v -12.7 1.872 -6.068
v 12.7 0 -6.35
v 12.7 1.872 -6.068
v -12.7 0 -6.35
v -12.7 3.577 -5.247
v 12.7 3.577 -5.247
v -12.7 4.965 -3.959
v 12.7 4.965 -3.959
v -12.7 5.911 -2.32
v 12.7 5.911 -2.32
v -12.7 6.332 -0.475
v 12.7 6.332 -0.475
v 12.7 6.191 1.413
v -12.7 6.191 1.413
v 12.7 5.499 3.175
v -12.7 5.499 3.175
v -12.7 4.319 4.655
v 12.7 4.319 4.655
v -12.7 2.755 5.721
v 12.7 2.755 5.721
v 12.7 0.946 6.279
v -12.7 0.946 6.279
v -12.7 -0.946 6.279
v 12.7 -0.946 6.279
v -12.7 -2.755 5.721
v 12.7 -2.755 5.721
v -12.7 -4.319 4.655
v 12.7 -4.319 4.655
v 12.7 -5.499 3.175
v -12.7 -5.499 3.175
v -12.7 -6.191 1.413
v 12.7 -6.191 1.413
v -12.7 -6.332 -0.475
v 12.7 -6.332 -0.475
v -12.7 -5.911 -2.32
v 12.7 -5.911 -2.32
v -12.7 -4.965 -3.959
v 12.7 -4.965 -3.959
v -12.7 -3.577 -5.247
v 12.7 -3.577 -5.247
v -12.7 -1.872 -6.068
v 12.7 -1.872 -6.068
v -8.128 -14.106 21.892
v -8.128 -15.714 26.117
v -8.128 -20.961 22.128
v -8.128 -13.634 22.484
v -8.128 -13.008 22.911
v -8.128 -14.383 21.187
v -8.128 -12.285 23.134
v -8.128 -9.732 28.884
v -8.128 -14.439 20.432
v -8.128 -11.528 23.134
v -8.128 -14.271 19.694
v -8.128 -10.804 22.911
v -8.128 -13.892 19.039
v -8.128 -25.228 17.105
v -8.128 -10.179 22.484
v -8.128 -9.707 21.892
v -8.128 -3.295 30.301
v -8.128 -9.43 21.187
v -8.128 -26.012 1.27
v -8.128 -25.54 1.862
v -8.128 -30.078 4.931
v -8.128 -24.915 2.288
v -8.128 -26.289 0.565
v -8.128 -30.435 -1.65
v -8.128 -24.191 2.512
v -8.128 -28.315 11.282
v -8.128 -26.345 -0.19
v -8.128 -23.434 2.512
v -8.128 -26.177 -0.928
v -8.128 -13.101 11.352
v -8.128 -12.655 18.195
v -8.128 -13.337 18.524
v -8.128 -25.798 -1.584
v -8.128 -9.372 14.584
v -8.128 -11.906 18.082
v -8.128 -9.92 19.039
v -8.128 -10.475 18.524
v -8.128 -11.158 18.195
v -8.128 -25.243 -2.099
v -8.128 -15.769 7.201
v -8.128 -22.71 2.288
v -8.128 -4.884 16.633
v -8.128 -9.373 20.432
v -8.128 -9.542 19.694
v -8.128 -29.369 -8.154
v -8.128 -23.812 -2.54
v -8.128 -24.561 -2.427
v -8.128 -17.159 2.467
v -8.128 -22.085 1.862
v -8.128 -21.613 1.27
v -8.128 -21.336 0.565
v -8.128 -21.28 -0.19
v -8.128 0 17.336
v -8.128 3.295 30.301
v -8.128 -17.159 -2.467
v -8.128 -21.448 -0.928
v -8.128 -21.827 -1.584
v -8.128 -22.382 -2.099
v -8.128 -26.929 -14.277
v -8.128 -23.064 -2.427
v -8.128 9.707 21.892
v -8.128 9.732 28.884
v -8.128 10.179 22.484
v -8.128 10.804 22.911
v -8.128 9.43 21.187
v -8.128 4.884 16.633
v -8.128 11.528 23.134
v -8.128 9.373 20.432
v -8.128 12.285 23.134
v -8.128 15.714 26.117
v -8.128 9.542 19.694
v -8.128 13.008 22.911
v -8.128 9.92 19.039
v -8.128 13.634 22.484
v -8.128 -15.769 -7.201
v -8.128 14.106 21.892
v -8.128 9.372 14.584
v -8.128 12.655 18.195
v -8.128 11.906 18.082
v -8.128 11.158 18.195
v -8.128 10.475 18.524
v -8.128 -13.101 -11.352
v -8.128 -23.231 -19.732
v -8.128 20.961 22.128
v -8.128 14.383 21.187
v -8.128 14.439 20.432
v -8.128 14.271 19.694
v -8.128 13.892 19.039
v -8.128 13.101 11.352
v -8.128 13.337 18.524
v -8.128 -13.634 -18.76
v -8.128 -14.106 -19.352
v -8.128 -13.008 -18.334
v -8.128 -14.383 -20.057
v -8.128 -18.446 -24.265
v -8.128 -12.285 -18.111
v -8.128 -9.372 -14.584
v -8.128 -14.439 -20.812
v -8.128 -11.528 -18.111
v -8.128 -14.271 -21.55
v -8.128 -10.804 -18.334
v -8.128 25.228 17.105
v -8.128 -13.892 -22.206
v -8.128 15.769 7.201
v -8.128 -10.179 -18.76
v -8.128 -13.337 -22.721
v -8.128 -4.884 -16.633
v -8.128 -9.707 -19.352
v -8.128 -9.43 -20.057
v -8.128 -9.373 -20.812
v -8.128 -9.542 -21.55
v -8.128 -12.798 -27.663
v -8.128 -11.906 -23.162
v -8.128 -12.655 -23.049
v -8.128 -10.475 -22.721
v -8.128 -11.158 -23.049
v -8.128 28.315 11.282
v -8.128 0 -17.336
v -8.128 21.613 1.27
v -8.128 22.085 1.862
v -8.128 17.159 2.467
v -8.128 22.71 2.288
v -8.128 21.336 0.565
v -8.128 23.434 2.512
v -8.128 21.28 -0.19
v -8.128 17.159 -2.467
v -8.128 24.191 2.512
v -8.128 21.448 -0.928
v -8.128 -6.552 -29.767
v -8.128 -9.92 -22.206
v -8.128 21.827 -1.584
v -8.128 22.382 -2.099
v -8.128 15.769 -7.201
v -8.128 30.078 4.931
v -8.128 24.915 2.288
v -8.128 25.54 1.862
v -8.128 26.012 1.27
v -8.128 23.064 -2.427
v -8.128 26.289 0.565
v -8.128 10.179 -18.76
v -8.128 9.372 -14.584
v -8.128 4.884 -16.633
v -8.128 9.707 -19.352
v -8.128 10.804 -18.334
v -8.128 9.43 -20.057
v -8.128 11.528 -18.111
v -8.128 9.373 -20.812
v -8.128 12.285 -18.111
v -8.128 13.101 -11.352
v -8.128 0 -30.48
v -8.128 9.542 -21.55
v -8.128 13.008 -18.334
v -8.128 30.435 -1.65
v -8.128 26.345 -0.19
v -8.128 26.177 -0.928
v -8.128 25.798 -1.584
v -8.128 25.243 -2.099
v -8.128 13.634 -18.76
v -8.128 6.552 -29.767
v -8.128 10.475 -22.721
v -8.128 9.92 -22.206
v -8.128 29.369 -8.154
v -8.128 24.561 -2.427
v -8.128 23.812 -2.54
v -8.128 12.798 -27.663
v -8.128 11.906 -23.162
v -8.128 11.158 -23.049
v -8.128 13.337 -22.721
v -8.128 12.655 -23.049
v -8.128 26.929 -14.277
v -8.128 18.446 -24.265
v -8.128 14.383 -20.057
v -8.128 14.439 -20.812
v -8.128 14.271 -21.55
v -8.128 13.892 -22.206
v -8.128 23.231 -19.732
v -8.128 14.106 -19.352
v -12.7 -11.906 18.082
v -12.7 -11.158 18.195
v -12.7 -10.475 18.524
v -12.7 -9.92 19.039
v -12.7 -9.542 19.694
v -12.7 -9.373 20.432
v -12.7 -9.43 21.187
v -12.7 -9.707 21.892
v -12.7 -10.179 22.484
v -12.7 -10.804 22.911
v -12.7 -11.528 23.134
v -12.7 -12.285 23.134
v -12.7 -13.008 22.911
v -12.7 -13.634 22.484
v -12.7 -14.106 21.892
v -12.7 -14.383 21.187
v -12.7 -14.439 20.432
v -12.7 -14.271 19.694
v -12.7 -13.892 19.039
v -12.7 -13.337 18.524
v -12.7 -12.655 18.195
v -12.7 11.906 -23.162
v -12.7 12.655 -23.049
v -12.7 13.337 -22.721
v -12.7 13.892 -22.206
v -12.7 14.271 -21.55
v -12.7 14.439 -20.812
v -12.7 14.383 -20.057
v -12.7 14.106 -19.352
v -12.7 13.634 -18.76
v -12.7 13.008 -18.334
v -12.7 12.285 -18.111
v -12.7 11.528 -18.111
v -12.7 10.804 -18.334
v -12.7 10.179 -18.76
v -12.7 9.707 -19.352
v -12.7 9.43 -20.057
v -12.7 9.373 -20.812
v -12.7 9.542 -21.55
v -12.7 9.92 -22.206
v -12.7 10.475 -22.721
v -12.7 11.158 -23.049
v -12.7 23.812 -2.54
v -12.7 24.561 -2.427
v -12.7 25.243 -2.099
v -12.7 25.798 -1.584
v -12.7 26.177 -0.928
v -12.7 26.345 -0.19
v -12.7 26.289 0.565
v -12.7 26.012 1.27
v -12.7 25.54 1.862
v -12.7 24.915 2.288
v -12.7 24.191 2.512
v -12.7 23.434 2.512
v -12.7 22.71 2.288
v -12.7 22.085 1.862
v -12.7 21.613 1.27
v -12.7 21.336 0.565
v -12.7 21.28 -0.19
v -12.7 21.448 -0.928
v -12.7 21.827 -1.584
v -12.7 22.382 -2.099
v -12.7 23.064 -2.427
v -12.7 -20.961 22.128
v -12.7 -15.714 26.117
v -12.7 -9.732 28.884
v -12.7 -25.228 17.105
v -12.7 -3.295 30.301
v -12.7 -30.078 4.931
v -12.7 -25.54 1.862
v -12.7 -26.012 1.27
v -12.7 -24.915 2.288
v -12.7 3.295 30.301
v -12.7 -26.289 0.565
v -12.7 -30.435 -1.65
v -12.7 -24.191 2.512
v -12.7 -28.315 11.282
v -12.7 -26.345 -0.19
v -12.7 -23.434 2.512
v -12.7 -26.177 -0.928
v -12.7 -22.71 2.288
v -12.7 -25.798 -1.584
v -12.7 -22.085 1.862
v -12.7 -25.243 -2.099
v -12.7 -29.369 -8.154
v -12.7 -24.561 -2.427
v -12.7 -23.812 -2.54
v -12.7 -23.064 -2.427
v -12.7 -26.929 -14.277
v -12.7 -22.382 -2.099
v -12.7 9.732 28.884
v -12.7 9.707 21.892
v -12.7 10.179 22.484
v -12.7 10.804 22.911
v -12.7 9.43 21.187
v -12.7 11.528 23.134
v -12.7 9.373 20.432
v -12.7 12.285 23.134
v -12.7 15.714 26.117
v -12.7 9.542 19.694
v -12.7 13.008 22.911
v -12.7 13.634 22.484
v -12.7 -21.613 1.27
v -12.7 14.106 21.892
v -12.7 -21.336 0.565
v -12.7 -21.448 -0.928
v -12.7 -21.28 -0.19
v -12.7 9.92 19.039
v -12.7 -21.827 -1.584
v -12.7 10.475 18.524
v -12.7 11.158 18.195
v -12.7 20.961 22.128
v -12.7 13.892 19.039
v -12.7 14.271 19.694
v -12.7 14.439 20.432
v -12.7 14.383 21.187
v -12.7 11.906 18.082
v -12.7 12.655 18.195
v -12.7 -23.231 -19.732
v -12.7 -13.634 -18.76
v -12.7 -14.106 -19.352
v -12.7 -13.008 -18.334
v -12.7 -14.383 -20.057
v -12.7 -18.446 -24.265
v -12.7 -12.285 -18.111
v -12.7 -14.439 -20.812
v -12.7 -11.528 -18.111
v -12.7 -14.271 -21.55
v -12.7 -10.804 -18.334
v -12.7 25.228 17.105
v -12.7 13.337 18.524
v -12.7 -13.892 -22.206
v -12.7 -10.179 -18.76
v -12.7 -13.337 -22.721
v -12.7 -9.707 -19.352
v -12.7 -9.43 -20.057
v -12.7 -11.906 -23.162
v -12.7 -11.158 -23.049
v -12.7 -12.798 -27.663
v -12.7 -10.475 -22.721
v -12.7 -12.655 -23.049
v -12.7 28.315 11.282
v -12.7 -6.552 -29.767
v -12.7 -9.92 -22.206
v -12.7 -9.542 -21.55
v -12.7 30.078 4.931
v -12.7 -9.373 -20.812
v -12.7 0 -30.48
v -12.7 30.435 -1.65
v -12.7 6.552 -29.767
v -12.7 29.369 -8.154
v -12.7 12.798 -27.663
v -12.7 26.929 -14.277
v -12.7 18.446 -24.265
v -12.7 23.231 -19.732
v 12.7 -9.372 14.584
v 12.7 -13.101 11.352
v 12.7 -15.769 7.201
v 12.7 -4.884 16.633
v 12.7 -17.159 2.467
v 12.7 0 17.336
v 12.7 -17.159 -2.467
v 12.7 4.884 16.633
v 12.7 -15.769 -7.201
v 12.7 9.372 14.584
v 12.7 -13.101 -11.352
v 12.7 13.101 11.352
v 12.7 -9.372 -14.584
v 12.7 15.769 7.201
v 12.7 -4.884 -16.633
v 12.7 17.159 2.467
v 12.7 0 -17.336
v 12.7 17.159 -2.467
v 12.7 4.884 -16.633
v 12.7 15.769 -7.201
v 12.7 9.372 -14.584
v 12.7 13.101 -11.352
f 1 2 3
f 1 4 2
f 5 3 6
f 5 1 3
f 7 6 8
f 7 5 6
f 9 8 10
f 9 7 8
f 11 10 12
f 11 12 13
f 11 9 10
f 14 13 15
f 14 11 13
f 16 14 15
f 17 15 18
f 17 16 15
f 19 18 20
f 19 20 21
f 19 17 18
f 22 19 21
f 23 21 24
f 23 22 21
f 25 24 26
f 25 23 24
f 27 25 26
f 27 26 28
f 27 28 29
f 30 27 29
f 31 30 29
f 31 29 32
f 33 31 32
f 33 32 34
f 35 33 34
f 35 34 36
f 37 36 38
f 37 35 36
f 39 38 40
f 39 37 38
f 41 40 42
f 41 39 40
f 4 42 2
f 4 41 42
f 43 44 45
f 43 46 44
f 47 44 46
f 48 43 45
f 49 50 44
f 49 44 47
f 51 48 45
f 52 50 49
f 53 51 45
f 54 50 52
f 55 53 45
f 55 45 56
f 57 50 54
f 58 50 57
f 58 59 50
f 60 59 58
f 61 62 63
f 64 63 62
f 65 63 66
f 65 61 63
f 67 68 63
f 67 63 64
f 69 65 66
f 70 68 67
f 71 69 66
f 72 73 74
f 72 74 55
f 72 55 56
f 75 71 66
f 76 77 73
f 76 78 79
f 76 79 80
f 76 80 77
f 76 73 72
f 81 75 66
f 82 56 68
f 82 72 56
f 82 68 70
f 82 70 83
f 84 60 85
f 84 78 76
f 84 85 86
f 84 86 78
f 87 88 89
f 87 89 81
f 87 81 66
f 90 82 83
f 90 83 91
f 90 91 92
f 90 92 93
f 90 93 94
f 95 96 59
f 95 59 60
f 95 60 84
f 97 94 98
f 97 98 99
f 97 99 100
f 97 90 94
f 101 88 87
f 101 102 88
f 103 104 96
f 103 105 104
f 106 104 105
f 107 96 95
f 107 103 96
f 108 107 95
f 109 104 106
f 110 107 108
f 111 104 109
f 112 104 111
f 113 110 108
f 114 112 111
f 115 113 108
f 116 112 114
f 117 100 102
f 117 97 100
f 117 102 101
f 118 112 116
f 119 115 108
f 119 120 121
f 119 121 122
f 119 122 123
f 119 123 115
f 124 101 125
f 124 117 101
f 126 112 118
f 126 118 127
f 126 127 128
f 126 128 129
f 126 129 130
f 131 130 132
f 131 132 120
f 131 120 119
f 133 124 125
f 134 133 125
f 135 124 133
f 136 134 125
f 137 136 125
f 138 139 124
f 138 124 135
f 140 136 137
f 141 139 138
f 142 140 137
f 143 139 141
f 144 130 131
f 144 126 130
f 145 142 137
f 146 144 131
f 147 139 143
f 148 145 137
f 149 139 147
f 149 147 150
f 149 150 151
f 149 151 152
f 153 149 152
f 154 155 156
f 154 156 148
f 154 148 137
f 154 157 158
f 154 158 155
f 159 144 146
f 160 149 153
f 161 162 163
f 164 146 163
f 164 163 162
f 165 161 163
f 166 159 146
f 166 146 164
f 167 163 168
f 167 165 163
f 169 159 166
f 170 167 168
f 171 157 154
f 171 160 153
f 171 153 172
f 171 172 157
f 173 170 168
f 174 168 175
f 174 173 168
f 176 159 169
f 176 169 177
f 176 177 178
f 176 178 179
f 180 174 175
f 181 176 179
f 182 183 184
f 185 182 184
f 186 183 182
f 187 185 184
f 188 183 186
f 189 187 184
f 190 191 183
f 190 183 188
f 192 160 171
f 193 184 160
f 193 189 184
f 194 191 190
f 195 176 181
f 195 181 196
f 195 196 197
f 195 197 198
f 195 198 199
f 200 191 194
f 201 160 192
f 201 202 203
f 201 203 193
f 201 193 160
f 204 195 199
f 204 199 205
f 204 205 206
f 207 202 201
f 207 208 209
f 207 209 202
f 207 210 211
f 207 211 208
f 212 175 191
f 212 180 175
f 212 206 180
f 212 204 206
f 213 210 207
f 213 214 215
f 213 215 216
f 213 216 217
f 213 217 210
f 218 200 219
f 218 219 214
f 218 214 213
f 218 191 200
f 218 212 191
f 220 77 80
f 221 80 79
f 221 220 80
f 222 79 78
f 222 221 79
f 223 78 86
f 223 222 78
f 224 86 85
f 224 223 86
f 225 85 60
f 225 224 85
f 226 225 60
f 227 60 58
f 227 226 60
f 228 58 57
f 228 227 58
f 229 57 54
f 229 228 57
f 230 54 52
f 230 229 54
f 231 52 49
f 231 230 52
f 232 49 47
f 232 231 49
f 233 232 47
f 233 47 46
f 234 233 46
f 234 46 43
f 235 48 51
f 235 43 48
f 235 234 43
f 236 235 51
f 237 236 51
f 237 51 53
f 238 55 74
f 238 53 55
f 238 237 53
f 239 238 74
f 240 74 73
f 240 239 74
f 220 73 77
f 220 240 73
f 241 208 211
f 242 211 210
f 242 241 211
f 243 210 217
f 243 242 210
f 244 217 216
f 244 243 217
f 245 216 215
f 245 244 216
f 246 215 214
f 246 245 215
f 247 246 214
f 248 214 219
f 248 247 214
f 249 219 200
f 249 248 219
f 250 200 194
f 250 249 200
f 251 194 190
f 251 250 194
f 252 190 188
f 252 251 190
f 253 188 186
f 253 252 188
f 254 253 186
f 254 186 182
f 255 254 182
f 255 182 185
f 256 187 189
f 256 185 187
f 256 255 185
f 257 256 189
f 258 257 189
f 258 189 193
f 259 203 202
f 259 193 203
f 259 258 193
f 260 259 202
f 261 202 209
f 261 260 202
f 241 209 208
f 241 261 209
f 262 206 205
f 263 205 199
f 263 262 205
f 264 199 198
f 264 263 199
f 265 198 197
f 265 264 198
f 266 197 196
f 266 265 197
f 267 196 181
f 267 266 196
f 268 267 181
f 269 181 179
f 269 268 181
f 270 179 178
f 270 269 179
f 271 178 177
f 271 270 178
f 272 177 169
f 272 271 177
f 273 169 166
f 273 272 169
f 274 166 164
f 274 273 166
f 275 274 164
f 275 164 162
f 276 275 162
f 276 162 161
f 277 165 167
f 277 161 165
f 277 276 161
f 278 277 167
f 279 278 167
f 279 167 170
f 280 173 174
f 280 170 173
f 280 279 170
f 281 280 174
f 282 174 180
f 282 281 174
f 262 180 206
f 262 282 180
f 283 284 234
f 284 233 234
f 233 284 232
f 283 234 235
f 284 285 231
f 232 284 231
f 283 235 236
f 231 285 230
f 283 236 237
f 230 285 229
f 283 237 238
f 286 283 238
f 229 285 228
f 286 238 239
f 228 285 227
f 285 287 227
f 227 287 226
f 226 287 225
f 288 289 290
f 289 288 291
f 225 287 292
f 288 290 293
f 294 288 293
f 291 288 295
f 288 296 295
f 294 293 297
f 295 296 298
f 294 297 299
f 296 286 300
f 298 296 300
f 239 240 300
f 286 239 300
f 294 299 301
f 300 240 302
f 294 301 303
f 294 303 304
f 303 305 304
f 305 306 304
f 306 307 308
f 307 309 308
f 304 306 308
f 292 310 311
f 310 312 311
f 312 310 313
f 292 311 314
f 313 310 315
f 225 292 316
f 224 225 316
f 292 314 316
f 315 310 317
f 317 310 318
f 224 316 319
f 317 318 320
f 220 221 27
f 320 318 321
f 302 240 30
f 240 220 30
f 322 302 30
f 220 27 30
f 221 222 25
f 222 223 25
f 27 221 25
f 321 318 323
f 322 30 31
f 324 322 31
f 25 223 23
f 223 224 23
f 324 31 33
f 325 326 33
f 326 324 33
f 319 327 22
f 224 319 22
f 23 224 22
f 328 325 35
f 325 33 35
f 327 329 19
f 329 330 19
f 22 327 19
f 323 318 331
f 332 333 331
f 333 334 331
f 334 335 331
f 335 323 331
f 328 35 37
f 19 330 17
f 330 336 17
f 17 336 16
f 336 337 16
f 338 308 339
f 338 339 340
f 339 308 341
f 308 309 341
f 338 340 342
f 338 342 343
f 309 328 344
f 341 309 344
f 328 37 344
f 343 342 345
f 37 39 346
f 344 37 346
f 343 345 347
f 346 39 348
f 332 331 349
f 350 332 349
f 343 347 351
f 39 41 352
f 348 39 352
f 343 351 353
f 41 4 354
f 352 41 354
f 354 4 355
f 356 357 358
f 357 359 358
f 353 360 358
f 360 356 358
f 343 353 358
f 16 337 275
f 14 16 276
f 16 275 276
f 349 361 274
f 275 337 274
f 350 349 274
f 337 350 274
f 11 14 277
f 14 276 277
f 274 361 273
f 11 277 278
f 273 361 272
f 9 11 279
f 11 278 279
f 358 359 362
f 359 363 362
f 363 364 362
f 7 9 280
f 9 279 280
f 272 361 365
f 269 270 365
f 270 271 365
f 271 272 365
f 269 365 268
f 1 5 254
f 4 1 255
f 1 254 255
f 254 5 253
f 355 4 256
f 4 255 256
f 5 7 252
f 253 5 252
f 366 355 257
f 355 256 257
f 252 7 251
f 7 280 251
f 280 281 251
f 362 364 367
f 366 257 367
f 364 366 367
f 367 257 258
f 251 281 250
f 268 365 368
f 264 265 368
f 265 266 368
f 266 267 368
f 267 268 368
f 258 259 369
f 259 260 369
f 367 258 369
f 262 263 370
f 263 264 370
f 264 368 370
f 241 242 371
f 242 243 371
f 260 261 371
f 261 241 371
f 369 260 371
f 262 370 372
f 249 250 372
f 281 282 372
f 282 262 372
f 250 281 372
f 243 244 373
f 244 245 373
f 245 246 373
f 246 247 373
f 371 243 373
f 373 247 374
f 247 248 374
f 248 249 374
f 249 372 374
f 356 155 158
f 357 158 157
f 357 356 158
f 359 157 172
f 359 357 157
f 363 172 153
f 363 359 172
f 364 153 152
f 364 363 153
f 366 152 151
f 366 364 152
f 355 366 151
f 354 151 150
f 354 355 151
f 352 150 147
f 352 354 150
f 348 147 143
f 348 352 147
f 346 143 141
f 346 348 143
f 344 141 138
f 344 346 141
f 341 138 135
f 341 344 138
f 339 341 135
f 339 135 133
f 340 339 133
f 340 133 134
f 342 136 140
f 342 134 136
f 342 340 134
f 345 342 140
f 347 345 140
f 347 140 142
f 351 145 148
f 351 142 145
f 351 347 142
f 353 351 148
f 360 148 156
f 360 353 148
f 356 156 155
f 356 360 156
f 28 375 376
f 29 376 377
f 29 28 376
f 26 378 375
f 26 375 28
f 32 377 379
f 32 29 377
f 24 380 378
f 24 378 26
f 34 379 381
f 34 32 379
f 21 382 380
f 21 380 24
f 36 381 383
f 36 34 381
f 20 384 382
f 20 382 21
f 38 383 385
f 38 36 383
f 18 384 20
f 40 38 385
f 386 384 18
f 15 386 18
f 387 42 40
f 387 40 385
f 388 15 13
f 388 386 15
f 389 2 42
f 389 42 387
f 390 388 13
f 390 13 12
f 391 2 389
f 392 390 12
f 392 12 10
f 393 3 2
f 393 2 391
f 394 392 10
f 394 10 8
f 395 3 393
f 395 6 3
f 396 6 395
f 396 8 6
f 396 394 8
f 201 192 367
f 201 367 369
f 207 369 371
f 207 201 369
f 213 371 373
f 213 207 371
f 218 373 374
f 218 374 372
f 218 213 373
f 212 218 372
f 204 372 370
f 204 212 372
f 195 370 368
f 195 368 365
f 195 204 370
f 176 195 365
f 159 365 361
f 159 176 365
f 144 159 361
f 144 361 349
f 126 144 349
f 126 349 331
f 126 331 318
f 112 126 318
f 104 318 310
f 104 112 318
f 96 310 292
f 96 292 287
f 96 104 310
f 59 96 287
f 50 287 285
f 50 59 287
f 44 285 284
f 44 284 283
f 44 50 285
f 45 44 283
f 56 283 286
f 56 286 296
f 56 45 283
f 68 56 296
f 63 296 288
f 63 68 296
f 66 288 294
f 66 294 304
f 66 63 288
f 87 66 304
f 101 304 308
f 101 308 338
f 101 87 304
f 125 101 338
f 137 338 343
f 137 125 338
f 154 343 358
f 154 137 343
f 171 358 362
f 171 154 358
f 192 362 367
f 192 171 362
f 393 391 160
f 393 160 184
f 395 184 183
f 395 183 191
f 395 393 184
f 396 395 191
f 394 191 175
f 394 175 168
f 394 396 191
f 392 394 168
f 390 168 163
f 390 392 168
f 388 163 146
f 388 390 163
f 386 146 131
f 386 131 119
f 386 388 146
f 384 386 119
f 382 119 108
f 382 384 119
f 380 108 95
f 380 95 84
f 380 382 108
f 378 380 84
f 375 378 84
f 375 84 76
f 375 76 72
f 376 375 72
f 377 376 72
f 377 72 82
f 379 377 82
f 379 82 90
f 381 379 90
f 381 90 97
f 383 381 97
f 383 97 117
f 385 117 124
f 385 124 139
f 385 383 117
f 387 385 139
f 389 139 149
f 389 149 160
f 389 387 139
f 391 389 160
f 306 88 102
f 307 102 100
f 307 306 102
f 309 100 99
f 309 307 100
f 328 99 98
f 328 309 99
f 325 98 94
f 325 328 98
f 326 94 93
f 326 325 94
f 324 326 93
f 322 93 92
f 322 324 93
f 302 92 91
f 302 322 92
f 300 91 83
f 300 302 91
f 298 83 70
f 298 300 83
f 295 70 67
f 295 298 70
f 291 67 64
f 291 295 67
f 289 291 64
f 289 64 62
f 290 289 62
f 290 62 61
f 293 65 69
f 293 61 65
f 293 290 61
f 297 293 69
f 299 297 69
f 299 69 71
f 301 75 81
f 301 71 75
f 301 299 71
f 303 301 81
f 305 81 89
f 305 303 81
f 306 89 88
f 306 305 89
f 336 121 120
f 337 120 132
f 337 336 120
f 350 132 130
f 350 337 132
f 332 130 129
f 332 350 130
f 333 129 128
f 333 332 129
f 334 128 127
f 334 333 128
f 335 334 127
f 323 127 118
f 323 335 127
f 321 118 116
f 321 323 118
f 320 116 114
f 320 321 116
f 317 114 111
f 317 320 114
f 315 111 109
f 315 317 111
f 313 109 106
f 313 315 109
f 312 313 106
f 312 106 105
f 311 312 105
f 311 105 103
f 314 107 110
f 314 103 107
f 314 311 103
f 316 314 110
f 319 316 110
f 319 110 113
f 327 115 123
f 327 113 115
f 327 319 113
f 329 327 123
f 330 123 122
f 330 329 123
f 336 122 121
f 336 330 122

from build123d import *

# Parameters (mm, degrees)
SKETCH1_R           = 30.48
SKETCH1_R_2         = 6.35
SKETCH1_R_3         = 2.54
BOSS_EXTRUDE1_DEPTH = 12.7
SKETCH2_OUTSIDE_W   = 80.934
SKETCH2_OUTSIDE_H   = 80.934
SKETCH2_OUTSIDE_R   = 17.3355
CUT_EXTRUDE1_DEPTH  = 20.828


with BuildPart() as part:
    # Sketch1 → Boss-Extrude1 (new body, symmetric)
    with BuildSketch(Plane(origin=(0, 0, 0), x_dir=(0, 0, -1), z_dir=(1, 0, 0))):
        Circle(SKETCH1_R)
        Circle(SKETCH1_R_2, mode=Mode.SUBTRACT)
        with Locations((0, 23.8125)):
            Circle(SKETCH1_R_3, mode=Mode.SUBTRACT)
        with Locations((20.622229928, 11.90625)):
            Circle(SKETCH1_R_3, mode=Mode.SUBTRACT)
        with Locations((20.622229928, -11.90625)):
            Circle(SKETCH1_R_3, mode=Mode.SUBTRACT)
        with Locations((0, -23.8125)):
            Circle(SKETCH1_R_3, mode=Mode.SUBTRACT)
        with Locations((-20.622229928, -11.90625)):
            Circle(SKETCH1_R_3, mode=Mode.SUBTRACT)
        with Locations((-20.622229928, 11.90625)):
            Circle(SKETCH1_R_3, mode=Mode.SUBTRACT)
    extrude(amount=BOSS_EXTRUDE1_DEPTH, both=True)

    # Sketch2 outside → Cut-Extrude1 (cut)
    with BuildSketch(Plane(origin=(12.7, 0, 0), x_dir=(0, 0, -1), z_dir=(1, 0, 0))):
        Rectangle(SKETCH2_OUTSIDE_W, SKETCH2_OUTSIDE_H)
        Circle(SKETCH2_OUTSIDE_R, mode=Mode.SUBTRACT)
    extrude(amount=-CUT_EXTRUDE1_DEPTH, mode=Mode.SUBTRACT)


solid = part.part
